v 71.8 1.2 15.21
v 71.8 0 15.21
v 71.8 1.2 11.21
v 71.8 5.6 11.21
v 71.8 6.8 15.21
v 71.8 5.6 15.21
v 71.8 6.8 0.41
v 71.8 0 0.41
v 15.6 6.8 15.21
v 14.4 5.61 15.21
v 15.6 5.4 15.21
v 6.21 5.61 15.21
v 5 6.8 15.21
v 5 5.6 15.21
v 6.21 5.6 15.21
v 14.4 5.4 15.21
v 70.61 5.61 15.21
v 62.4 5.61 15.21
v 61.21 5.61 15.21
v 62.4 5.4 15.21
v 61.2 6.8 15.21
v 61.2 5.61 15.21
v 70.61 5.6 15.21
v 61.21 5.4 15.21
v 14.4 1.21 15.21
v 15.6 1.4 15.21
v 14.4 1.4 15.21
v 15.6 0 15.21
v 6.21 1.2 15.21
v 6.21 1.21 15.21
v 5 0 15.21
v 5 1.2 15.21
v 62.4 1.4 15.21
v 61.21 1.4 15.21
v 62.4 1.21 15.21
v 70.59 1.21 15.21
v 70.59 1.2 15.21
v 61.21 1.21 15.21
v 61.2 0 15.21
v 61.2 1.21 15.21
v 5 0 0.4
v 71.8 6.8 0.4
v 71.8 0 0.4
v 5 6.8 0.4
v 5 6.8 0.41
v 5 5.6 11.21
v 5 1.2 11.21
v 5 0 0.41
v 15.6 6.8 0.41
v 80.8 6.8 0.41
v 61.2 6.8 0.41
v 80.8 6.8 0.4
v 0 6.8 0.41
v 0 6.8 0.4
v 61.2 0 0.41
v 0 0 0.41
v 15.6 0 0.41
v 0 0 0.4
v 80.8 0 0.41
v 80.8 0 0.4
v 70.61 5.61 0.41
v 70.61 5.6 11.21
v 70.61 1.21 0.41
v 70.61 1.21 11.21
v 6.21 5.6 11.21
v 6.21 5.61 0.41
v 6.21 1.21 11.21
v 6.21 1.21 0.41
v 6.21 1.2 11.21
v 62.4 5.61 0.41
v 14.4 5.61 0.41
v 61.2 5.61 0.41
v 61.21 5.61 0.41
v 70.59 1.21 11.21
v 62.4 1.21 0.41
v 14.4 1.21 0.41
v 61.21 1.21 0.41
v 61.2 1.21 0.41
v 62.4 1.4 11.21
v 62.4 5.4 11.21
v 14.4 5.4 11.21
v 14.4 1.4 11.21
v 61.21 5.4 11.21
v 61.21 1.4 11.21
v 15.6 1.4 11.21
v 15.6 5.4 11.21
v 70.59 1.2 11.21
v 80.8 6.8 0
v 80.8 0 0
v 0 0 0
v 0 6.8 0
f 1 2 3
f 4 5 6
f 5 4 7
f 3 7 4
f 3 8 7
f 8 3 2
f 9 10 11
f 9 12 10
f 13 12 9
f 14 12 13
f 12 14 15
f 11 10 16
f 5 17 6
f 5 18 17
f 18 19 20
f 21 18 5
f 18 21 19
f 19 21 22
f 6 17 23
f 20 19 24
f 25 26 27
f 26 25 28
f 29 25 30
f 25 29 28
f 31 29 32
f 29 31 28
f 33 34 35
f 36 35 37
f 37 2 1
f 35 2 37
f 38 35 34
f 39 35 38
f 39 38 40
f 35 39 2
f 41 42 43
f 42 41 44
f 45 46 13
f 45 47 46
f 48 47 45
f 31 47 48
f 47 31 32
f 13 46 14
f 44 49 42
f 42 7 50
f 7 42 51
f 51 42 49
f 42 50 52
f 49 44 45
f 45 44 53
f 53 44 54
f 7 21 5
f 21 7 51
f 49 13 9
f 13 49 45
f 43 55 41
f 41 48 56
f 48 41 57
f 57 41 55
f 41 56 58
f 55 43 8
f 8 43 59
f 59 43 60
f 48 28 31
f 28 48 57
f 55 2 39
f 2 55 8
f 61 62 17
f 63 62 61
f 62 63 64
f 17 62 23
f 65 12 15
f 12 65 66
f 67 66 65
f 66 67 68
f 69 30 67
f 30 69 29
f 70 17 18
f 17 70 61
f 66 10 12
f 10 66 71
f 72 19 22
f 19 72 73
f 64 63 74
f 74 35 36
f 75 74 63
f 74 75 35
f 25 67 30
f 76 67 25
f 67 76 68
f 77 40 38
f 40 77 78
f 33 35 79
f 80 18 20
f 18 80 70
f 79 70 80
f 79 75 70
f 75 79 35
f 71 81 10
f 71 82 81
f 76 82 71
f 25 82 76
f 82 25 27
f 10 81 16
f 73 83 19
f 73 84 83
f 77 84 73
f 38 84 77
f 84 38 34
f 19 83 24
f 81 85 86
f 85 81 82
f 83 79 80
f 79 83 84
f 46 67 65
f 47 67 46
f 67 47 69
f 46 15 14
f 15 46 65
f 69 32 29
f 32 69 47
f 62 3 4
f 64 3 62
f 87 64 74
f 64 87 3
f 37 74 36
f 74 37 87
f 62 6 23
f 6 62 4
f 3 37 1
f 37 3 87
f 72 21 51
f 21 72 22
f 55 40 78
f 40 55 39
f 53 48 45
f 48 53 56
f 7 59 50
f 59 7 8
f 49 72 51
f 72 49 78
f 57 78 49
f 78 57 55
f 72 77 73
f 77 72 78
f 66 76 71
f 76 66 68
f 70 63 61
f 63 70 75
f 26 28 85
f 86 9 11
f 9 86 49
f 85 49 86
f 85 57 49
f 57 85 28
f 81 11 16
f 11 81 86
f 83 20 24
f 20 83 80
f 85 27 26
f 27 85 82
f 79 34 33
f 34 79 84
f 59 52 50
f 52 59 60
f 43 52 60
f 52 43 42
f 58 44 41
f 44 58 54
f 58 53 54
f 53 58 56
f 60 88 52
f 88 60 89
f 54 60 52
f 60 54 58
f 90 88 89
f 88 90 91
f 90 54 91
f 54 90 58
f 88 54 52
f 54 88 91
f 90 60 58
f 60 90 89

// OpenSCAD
// file: ../../Base/Rotation.scad
// Fischertechnik Box Foundation
// Geometry Helpers Rotation

include <PlacementOptions.scad>

// getRotatedSpace(space, rotation=NoRotation)
// Rotates the space dependent on the specified rotation

function getRotatedSpace(space, rotation=NoRotation) = [
    (rotation == Rotate90 || rotation == Rotate270) ? space.y : space.x,
    (rotation == Rotate90 || rotation == Rotate270) ? space.x : space.y
];

// Rotates the given space around the fixed left lower corner
// space = the space the children needs as width/depth list [width,depth]
// rotation = 0 Rotate0 degrees, 1 Rotate90 degrees, 2 Rotate180 degrees, 3 Rotate270 degrees (equivalent to -90)

module RotateFix(space, rotation=NoRotation) {
    dy = (rotation == Rotate0 || rotation == Rotate270) ? 0 :
        (rotation == Rotate90) ? space.x :
        space.y;
    dx = (rotation < Rotate180) ? 0 :
        (rotation == Rotate180) ? space.x :
        space.y;
    
    translate([dx, dy, 0])
        rotate([0, 0, rotations[rotation]])
            children();
}
// file: ../../Base/Alignment.scad
// Fischertechnik Box Foundation
// Geometry Helpers Alignment

include <PlacementOptions.scad>

// getAlignedX(elementWidth, spaceWidth, align=AlignRight, offset=0)
// Gets the aligned X offset of an element with the given
// width in the given space.
// elementWidth = The width of the element to positon
// spaceWidth = The space where the element should be aligned
// align = 0 AlignLeft, 1 AlignCenter, 2 AlignRight
// offset = an optional offset from the aligned position. When
// aligned left or centered, then positive values are in X direction.
// When aligned right then positive values are in negative X direction.

function getAlignedX(elementWidth, spaceWidth, align=AlignRight, offset=0) =
    (align == AlignLeft) ?
        offset :
        ((align == AlignCenter) ?
        (spaceWidth - elementWidth)/2 + offset :
        spaceWidth - offset - elementWidth);

// getAlignedY(elementDepth, spaceDepth, align=AlignTop, offset=0)
// Gets the aligned Y offset of an element with the given
// depth in the given space.
// elementDepth = The depth of the element to positon
// spaceDepth = The space where the element should be aligned
// align = 0 AlignBottom, 1 AlignCenter, 2 AlignTop
// offset = an optional offset from the aligned position. When
// aligned bottom or centered, then positive values are in Y direction.
// When aligned top then positive values are in negative Y direction.

function getAlignedY(elementDepth, spaceDepth, align=AlignTop, offset=0) =
    (align == AlignBottom) ?
        offset :
        ((align == AlignCenter) ?
        (spaceDepth - elementDepth)/2 + offset :
        spaceDepth - offset - elementDepth);
// file: ../../Base/PlacementOptions.scad
// Fischertechnik Box Foundation
// Placement Options

// Alignment
NoAlign = 0;
AlignLeft = 1;
AlignBottom = 2;
AlignCenter = 3;
AlignRight = 4;
AlignTop = 5;

// Element rotation degree steps
rotations = [0, -90, -180, -270];

// Rotation
NoRotation = 0;
Rotate0 = 0;
Rotate90 = 1;
Rotate180 = 2;
Rotate270 = 3;

// Docking (seen from above)
NoDock = -1;
DockLeft = 0;
DockTop = 1;
DockRight = 2;
DockCorner = 2;
DockBottom = 3;

// Web corners
LowerLeft = 0;
UpperLeft = 1;
UpperRight = 2;
LowerRight = 3;

// Web position relative to corner
LeftOfCorner = 0;
RightOfCorner = 1;
// file: ../../Base/Boxes.scad
// Fischertechnik Box Foundation
// Pre-designed Boxes

use <Constants.scad>

include <PlacementOptions.scad>

box190Width = 190;
box190Depth = 130;
box130Width = 130;
box130Depth = 95;

// Values are from an original ec3 box
topBottomDifference = 1.5;
outerHeight = 40;
innerHeight = 38.2;
baseThickness = outerHeight - innerHeight;
stackExcess = 5.7;
radius = 3.5;
wallThickness = 1.5;
tolerance = 0.2;
stackOffset = innerHeight - stackExcess;

boxUsageHeight = stackOffset;
boxWallThickness = wallThickness;
boxBaseThickness = baseThickness;
boxWebWidth = 3.0;

// getBoxWallThickness()
// Gets the wall thickness of a Fischertechnik Box
function getBoxWallThickness() = boxWallThickness;

// getBoxUsageHeight()
// Gets the usable height of a Fischertechnik box
function getBoxUsageHeight() = boxUsageHeight;

// getBoxInnerHeight()
// Gets the inner height of a Fischertechnik box, including the stack excess
function getBoxInnerHeight() = innerHeight;

// getBoxBaseThickness()
// Gets the thickness of the Fischertechnik box base.
function getBoxBaseThickness() = boxBaseThickness;

// getBoxWebWidth()
// Gets the width of a box web
function getBoxWebWidth() = boxWebWidth;

// getBox190Space()
// Gets the usable inner space of a Box 190 as an x/y-list
function getBox190Space() = [
    box190Width - 2*getBoxWallThickness() - topBottomDifference, 
    box190Depth - 2*getBoxWallThickness() - topBottomDifference ];

// BoxBase(width, depth)
// Creates an empty stackable Fischertechnik compatible box
// width = Outer width of the box (190, 130, ...)
// depth = Outer depth of the box (130, 95, ...)

module BoxBase(width, depth, height=outerHeight) {    
    thinPlate = 0.01;

    innerHeight = height - baseThickness;    
    
    module BodyPlate(width, depth) {
        translate([radius, radius])
        hull() {
            w = width-2*radius;
            d = depth-2*radius;
            cube([w, d, thinPlate]);
            cylinder(thinPlate, r=radius, $fn=getFragments());
            translate([w, 0])
                cylinder(thinPlate, r=radius, $fn=getFragments());
            translate([w, d])
                cylinder(thinPlate, r=radius, $fn=getFragments());
            translate([0, d])
                cylinder(thinPlate, r=radius, $fn=getFragments());
        }
    }
    
    module Body(tolerance=tolerance) {
        hull() {
            // Bottom with tolerance to fit into the original boxes when stacked
            translate([-wallThickness+tolerance, -wallThickness+tolerance, -baseThickness])
                BodyPlate(width-topBottomDifference-2*tolerance, depth-topBottomDifference-2*tolerance);
            
            // Top
            translate([-wallThickness-topBottomDifference/2, -wallThickness-topBottomDifference/2, innerHeight-thinPlate])
                BodyPlate(width, depth);
         }
    }

    module Cutoff() {
        hull() {
            coWidth = width - 2*wallThickness;
            coDepth = depth - 2*wallThickness;
            
            // Bottom
            BodyPlate(coWidth-topBottomDifference, coDepth-topBottomDifference);

            // Top
            translate([-topBottomDifference/2, -topBottomDifference/2, innerHeight+thinPlate]) 
                BodyPlate(coWidth, coDepth);
        }
    }
    
    difference() {        
        Body();
        Cutoff();
        stackOffset = innerHeight - stackExcess;
        translate([0, 0, stackOffset + baseThickness])
            Body(tolerance=0);
    }
}

// Creates the Fischertechnik empty box 130x190 mm and places it at position 0,0
// 190x130 are the outer sizes, the inner space is slightly smaller. Use getBox190Space() to get the inner sizes.
// The box is positioned that the usable inner space is at the 0,0,0 position. The

module Box190() {
    BoxBase(box190Width, box190Depth);
}

// Gets the usable inner space of a Box 130 as an x/y-list
function getBox130Space() = [
    box130Width - 2*getBoxWallThickness() - topBottomDifference, 
    box130Depth - 2*getBoxWallThickness() - topBottomDifference ];

// Creates the Fischertechnik empty box 95x130 mm and places it at position 0,0
// 190x130 are the outer sizes, the inner space is slightly smaller. Use getBox190Space() to get the inner sizes.
// The box is positioned that the usable inner space is at the 0,0,0 position. The

module Box130() {
    BoxBase(box130Width, box130Depth);
}

// Creates a web at the specified box walls
// corner 0 = LowerLeft, 1 = UpperLeft, 2 = UpperRight, 3 = LowerRight
// side 0 = LeftOfCorner, 1 = RightOfCorner
// distance = Distance in mm from the corner
// boxSpace = inner width and depth of the box (default: Box 190)
// webWidth = length of the web (default is 3 mms)
// webThickness = thickness of the web (default is 1 mm)

module BoxWeb(corner, side, distance, boxSpace=getBox190Space(), webWidth=getBoxWebWidth(), webThickness=1.0) {
    sink = getBoxWallThickness()/2;

    width = (corner % 2 == 0) ? 
            (side == LeftOfCorner ? webWidth : webThickness) :
            (side == LeftOfCorner ? webThickness : webWidth);

    depth = (corner % 2 == 0) ? 
            (side == RightOfCorner ? webWidth : webThickness) :
            (side == RightOfCorner ? webThickness : webWidth);
    
    xDiff = corner == LowerLeft ? 
                (side == LeftOfCorner ? -sink : distance) :
            (corner == UpperLeft ?                
                (side == LeftOfCorner ? distance : -sink) :
            (corner == UpperRight ?
                (side == LeftOfCorner ? boxSpace.x-webWidth+sink : boxSpace.x-distance-webThickness) :
                (side == LeftOfCorner ? boxSpace.x-distance-webThickness: boxSpace.x-webWidth+sink)));

    yDiff = corner == LowerLeft ? 
                (side == RightOfCorner ? -sink : distance) :
            (corner == UpperLeft ?
                (side == RightOfCorner ? boxSpace.y-distance : boxSpace.y-webWidth+sink) :
            (corner == UpperRight ?
                (side == RightOfCorner ? boxSpace.y-webWidth+sink : boxSpace.y-distance) :
                (side == RightOfCorner ? distance : -sink)));
    
    translate([xDiff, yDiff, -getExcess()])
        cube([width, depth, boxUsageHeight + 2*getExcess()]);
}
// file: ../../Base/Placement.scad
// Fischertechnik Box Foundation
// Geometry Helpers Placement

use <Constants.scad>
use <Alignment.scad>
use <Rotation.scad>
use <Boxes.scad>

include <PlacementOptions.scad>

// Place(x=0, y=0, elementSpace=[0,0], alignX=AlignLeft, alignY=AlignBottom, rotation=Rotate0, boxSpace=getBox190Space())
// Places the child at the specified position
// y = Y-Position. This is a relative position when an X aligment is specified.
// x = X-Position. This is a relative position when an Y aligment is specified.
// elementSpace = space of the element to be placed [x,y]
// alignX = -1=NoAlign, 0 AlignLeft, 1 AlignCenter, 3 AlignRight (elementSpace and boxSpace required!)
// alignY = -1=NoAlign, 2 AlignBottom, 1 AlignCenter, 4 AlignTop (elementSpace and boxSpace required!)
// rotation = 0 Rotate0 0 degrees, 1 Rotate90 90 degrees, 
// 2 Rotate180 180 degrees, 3 Rotate270 270 degrees (equivalent to -90)
// boxSpace = Inner space of the box where the placement occurs [x,y] - default is Box 190x130 inner space

module Place(x=0, y=0, elementSpace=[0,0], 
  alignX=AlignLeft, alignY=AlignBottom, 
  rotation=NoRotation, boxSpace=getBox190Space()) {

    module Position(x, y, space, rotation=Rotate0) {
        translate([x, y, 0])
            RotateFix(space, rotation)
                children();
    }

    space = getRotatedSpace(elementSpace, rotation);
    alignedX = getAlignedX(space.x, boxSpace.x, alignX, x);
    alignedY = getAlignedY(space.y, boxSpace.y, alignY, y);
    Position(alignedX, alignedY, elementSpace, rotation)
        children();
}

// Center(space=getBox130Space(), elementSpace=[0,0])
// space = Space where the children is centered. For cylinder use centered=true and no elementSpace.
// elementSpace = space of the element to be centered [x,y]

module Center(space=getBox190Space(), elementSpace=[0,0]) {
    Place(elementSpace=elementSpace, boxSpace=space, alignX=AlignCenter, alignY=AlignCenter)
        children();
}

// CenterHorizontal(width=0, y=0, offset=0, space=getBox130Space())
// width = Width of the element to be placed.
// y = Y position of the element
// offset = Offset from the center position (negative will be left of the center)
// space = Space where the element is placed

module CenterHorizontal(width=0, y=0, offset=0, space=getBox190Space()) {
    Place(x=offset, y=y, elementSpace=[width, 0], boxSpace=space, alignX=AlignCenter)
        children(0);
}

// CenterVertical(depth=0, x=0, offset=0, space=getBox130Space())
// depth = Depth of the element to be placed.
// x = X position of the element
// offset = Offset from the center position (negative will be down of the center)
// space = Space where the element is placed

module CenterVertical(depth=0, x=0, offset=0, space=getBox190Space()) {
    Place(x=x, y=offset, elementSpace=[0, depth], boxSpace=space, alignY=AlignCenter)
        children(0);
}

// getIsVertical(align)
// True if the specified alignment needs a vertical orientation for a divider (AlignRight, AlignLeft)

function getIsVertical(align) = (align == AlignRight || align == AlignLeft);

// getIsHorizontal(align)
// True if the specified alignment needs a horizontal orientation for a divider (AlignTop, AlignBottom)

function getIsHorizontal(align) = (align == AlignTop || align == AlignBottom);
// file: ../../Elements/AxisClip10.scad
// Fischertechnik Box Library
// Axis for clip 10
// 31023

use <../ModelBase/Simple.scad>
use <../Base/Constants.scad>

width = 12;
depth = 12;
height = 23;
upperDiameter = 3.6;
clipHeight = 10;

// getAxisClip10Space()
// Gets the space of a frame for a clip 10 with spring ring (mot2)

function getAxisClip10Space() = [width, depth, height];

// AxisClip10(height, clipHeight)
// Axis for clip 10 with spring ring (mot2)
// height = Height of the complete axis
// clipHeight = Height of the rt for the clip (standard is 10, in mot3 its only 7)

module AxisClip10(height=height, clipHeight=clipHeight) {
    LeveledAxisWithSpace(height, height-clipHeight, getAxisClip10Space(), diameter=upperDiameter);
}

// Tests
color("lightgray")
AxisClip10();
// file: ../../Base/Constants.scad
// Fischertechnik Box Foundation
// Constants

// Constant values necessary for multiple elements

// Base constants
dividerThickness = 1.2;
excess = 0.01;
fragments = 90;
tolerance = 0.8;

// Gets the thickness of a divider 
function getDividerThickness() = dividerThickness;

// Gets the excess that is used to merge walls into each other
function getExcess() = excess;

// Gets amount of fragments of a cylinder
function getFragments() = fragments;

// Gets the inner tolerance of a frame to each side
function getTolerance() = tolerance;


// Fischertechnik specific constants
axisDiameter = 4;
axisBottomDiameter = axisDiameter + 1;
standardEdgeDistance = 2.5;
standardWebDistance = 11.5;
standardCornerLength = 15;
tubeWallFactor = 0.8;
smallPartsFrameHeight = 20;

// Gets axis diameter
function getAxisDiameter() = axisDiameter;

// Gets axis bottom diameter for thicker part at the bottom
function getAxisBottomDiameter() = axisBottomDiameter;

// gets the standard distance to the wall of the box for dockable frames with webs
function getStandardEdgeDistance() = standardEdgeDistance;

// gets the standard distance of each web to the corner of the dockable frame
function getStandardWebDistance() = standardWebDistance;

// gets the standard length of the corner walls of a dockable frame
function getStandardCornerLength() = standardCornerLength;

// gets the wall thickness of a tube.
function getTubeWallThickness() = tubeWallFactor * getDividerThickness();

// gets the frame height for docked small parts boxes.
function getSmallPartsFrameHeight() = smallPartsFrameHeight;
// file: ../../Elements/FrameBracketWithAxle80.scad
// Fischertechnik Box Library
// Frame for bracket with axle 80
// 38201

use <../Base/Constants.scad>
use <../ModelBase/Simple.scad>
use <../ModelBase/Complex.scad>

length = 66;
axisLength = 80;

completeSpace = [
    axisLength + getTolerance(), 
    getFrameAxisSpace(length).y,
    getFrameAxisHeight()];

// getFrameBracketWithAxle80Space()
// Gets the width (.x) and depth (.y) of the axis frame.

function getFrameBracketWithAxle80Space() = completeSpace;

// FrameBracketWithAxle80()
// Axis holder for a single 60 mm axis.

module FrameBracketWithAxle80() {
    Space(completeSpace);
    translate([5, 0])
        FrameAxis(length, true);
}

// Test
color("lightgray")
FrameBracketWithAxle80();
// file: ../TestPrint.scad
// 3D Print Test Base

use <../Base/Constants.scad>

use <../Elements/AxisClip10.scad>

module TestPrint(elementSpace) {
    cube([elementSpace.x, elementSpace.y, 0.4]);
    translate([0,0,0.4+getExcess()]) {
        children();
    }
}

TestPrint(getAxisClip10Space())
    AxisClip10();
// main file
// 3D Print Test
// FrameBracketWithAxle80

use <../TestPrint.scad>
use <../../Elements/FrameBracketWithAxle80.scad>

TestPrint(getFrameBracketWithAxle80Space())
    FrameBracketWithAxle80();
